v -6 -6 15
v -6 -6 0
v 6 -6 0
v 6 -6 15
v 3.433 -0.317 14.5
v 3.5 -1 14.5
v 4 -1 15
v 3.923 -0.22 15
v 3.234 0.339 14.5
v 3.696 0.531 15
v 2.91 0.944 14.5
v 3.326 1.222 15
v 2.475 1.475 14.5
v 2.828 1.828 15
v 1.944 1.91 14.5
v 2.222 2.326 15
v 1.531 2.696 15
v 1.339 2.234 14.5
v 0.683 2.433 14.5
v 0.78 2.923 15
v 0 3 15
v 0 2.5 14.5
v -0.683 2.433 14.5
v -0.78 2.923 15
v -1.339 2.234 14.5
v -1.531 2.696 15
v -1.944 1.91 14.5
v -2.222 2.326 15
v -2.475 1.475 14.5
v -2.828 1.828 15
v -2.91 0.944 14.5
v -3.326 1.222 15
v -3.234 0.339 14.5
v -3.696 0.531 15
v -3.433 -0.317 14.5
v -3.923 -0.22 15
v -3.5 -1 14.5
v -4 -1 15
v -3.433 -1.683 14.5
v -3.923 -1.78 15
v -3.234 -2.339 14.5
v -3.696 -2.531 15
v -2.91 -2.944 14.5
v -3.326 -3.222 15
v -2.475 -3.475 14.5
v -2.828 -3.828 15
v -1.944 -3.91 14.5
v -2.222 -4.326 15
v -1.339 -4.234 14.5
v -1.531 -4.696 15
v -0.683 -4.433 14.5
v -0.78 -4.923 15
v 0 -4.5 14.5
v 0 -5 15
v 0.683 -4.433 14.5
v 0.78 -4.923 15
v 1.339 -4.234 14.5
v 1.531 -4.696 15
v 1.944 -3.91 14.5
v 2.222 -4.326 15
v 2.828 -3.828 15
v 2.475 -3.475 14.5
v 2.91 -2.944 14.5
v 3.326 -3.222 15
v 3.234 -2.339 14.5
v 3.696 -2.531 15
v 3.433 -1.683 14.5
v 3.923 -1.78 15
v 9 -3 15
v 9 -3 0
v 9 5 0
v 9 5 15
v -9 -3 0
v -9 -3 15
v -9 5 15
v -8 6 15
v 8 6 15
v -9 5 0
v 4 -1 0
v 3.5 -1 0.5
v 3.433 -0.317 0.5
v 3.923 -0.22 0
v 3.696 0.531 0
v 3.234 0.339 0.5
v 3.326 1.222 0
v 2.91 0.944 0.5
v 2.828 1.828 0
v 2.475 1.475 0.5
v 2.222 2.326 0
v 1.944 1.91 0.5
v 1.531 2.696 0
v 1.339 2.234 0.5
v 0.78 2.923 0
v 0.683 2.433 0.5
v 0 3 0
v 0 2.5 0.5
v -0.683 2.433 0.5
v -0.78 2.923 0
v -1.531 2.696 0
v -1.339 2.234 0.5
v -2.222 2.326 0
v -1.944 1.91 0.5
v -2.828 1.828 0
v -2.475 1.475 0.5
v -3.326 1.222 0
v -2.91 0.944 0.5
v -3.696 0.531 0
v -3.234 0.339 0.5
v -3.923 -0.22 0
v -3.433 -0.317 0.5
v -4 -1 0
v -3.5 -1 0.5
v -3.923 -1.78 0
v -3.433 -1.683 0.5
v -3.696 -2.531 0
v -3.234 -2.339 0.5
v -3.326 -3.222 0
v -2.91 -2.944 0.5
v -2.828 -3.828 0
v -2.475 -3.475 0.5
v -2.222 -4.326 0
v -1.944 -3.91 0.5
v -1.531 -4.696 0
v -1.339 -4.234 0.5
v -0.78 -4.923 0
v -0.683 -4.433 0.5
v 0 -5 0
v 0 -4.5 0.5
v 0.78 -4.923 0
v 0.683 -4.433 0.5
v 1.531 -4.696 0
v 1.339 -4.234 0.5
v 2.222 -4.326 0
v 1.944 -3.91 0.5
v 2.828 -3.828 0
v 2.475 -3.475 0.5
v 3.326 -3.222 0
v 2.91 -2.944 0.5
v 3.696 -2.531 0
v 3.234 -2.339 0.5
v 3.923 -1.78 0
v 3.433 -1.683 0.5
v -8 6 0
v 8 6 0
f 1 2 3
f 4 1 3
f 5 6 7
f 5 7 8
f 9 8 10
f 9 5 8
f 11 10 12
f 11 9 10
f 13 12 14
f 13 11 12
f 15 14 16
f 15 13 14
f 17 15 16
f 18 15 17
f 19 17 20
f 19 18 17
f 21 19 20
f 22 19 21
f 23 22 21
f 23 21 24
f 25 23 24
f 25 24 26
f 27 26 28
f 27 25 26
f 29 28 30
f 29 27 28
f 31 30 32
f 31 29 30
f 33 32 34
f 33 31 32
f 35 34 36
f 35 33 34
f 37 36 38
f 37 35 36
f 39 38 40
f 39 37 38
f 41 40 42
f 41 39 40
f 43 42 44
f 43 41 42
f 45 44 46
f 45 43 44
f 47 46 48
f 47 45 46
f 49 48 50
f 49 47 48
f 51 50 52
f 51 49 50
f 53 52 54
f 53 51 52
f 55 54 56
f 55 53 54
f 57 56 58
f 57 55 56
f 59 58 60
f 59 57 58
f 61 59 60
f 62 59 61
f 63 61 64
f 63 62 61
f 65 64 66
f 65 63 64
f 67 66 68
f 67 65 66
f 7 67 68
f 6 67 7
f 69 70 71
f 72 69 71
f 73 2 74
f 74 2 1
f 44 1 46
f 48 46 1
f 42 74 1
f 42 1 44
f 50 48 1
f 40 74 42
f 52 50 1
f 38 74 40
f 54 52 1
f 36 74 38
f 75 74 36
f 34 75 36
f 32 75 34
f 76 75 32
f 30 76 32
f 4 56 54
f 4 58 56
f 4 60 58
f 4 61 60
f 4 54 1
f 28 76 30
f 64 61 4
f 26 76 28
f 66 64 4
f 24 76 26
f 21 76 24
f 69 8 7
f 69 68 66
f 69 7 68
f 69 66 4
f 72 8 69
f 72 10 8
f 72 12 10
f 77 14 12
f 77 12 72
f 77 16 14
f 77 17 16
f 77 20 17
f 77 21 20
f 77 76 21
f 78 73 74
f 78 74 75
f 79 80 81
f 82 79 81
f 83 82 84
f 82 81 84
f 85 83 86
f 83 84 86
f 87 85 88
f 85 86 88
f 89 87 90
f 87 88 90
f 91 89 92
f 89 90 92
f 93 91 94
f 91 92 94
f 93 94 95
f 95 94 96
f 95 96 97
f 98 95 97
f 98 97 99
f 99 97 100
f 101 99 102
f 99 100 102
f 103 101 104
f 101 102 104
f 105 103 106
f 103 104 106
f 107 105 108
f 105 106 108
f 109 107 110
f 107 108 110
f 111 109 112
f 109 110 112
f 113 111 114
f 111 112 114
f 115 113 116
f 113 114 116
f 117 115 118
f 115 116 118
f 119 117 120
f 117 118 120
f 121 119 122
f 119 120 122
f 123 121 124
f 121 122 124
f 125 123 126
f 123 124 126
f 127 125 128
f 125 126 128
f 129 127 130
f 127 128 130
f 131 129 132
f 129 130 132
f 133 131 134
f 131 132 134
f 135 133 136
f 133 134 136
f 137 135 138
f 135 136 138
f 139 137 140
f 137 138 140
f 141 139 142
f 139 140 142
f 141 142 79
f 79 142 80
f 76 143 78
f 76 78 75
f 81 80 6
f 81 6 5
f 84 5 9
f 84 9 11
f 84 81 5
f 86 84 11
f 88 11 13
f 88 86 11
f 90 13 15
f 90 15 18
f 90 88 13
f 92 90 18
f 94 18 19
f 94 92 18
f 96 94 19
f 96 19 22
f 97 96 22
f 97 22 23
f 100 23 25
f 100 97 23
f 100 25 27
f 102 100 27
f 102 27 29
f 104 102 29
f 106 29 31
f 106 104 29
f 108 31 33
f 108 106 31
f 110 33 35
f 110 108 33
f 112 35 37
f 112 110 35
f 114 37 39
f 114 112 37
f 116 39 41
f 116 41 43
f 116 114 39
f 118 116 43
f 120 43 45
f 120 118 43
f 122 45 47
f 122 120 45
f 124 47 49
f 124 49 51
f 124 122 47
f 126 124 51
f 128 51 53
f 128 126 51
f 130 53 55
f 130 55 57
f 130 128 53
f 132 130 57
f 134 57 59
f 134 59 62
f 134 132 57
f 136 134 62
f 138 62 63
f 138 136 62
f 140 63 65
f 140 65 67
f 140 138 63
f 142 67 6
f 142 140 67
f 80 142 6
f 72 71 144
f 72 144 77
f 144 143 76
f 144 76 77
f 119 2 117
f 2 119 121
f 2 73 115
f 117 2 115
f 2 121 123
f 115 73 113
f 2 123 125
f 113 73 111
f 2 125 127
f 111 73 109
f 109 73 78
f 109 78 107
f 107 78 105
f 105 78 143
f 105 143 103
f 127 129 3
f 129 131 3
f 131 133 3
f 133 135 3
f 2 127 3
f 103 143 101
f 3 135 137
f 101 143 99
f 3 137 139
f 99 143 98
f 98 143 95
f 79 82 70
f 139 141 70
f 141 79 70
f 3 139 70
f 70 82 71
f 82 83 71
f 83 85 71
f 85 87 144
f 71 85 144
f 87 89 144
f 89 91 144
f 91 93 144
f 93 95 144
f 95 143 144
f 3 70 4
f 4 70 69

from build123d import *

# Parameters (mm, degrees)
F0_W     = 18
F0_H     = 12
F0_R     = 3.5
F1_DEPTH = 15
F2_SIZE  = 3
F3_SIZE  = 1
F4_SIZE  = 0.5


with BuildPart() as f1:
    # F0 (on Top) → F1 (new body)
    with BuildSketch(Plane.XY):
        Rectangle(F0_W, F0_H)
        with Locations((0, -1)):
            Circle(F0_R, mode=Mode.SUBTRACT)
    extrude(amount=F1_DEPTH)

    # F2
    f2_edges = [f1.edges().sort_by_distance(p)[0] for p in [
        (9, -6, 7.5),
        (-9, -6, 7.5),
    ]]
    chamfer(f2_edges, length=F2_SIZE)

    # F3
    f3_edges = [f1.edges().sort_by_distance(p)[0] for p in [
        (9, 6, 7.5),
        (-9, 6, 7.5),
    ]]
    chamfer(f3_edges, length=F3_SIZE)

    # F4
    f4_edges = [f1.edges().sort_by_distance(p)[0] for p in [
        (-3.5, -1, 0),
        (-3.5, -1, 15),
    ]]
    chamfer(f4_edges, length=F4_SIZE)


solid = f1.part
